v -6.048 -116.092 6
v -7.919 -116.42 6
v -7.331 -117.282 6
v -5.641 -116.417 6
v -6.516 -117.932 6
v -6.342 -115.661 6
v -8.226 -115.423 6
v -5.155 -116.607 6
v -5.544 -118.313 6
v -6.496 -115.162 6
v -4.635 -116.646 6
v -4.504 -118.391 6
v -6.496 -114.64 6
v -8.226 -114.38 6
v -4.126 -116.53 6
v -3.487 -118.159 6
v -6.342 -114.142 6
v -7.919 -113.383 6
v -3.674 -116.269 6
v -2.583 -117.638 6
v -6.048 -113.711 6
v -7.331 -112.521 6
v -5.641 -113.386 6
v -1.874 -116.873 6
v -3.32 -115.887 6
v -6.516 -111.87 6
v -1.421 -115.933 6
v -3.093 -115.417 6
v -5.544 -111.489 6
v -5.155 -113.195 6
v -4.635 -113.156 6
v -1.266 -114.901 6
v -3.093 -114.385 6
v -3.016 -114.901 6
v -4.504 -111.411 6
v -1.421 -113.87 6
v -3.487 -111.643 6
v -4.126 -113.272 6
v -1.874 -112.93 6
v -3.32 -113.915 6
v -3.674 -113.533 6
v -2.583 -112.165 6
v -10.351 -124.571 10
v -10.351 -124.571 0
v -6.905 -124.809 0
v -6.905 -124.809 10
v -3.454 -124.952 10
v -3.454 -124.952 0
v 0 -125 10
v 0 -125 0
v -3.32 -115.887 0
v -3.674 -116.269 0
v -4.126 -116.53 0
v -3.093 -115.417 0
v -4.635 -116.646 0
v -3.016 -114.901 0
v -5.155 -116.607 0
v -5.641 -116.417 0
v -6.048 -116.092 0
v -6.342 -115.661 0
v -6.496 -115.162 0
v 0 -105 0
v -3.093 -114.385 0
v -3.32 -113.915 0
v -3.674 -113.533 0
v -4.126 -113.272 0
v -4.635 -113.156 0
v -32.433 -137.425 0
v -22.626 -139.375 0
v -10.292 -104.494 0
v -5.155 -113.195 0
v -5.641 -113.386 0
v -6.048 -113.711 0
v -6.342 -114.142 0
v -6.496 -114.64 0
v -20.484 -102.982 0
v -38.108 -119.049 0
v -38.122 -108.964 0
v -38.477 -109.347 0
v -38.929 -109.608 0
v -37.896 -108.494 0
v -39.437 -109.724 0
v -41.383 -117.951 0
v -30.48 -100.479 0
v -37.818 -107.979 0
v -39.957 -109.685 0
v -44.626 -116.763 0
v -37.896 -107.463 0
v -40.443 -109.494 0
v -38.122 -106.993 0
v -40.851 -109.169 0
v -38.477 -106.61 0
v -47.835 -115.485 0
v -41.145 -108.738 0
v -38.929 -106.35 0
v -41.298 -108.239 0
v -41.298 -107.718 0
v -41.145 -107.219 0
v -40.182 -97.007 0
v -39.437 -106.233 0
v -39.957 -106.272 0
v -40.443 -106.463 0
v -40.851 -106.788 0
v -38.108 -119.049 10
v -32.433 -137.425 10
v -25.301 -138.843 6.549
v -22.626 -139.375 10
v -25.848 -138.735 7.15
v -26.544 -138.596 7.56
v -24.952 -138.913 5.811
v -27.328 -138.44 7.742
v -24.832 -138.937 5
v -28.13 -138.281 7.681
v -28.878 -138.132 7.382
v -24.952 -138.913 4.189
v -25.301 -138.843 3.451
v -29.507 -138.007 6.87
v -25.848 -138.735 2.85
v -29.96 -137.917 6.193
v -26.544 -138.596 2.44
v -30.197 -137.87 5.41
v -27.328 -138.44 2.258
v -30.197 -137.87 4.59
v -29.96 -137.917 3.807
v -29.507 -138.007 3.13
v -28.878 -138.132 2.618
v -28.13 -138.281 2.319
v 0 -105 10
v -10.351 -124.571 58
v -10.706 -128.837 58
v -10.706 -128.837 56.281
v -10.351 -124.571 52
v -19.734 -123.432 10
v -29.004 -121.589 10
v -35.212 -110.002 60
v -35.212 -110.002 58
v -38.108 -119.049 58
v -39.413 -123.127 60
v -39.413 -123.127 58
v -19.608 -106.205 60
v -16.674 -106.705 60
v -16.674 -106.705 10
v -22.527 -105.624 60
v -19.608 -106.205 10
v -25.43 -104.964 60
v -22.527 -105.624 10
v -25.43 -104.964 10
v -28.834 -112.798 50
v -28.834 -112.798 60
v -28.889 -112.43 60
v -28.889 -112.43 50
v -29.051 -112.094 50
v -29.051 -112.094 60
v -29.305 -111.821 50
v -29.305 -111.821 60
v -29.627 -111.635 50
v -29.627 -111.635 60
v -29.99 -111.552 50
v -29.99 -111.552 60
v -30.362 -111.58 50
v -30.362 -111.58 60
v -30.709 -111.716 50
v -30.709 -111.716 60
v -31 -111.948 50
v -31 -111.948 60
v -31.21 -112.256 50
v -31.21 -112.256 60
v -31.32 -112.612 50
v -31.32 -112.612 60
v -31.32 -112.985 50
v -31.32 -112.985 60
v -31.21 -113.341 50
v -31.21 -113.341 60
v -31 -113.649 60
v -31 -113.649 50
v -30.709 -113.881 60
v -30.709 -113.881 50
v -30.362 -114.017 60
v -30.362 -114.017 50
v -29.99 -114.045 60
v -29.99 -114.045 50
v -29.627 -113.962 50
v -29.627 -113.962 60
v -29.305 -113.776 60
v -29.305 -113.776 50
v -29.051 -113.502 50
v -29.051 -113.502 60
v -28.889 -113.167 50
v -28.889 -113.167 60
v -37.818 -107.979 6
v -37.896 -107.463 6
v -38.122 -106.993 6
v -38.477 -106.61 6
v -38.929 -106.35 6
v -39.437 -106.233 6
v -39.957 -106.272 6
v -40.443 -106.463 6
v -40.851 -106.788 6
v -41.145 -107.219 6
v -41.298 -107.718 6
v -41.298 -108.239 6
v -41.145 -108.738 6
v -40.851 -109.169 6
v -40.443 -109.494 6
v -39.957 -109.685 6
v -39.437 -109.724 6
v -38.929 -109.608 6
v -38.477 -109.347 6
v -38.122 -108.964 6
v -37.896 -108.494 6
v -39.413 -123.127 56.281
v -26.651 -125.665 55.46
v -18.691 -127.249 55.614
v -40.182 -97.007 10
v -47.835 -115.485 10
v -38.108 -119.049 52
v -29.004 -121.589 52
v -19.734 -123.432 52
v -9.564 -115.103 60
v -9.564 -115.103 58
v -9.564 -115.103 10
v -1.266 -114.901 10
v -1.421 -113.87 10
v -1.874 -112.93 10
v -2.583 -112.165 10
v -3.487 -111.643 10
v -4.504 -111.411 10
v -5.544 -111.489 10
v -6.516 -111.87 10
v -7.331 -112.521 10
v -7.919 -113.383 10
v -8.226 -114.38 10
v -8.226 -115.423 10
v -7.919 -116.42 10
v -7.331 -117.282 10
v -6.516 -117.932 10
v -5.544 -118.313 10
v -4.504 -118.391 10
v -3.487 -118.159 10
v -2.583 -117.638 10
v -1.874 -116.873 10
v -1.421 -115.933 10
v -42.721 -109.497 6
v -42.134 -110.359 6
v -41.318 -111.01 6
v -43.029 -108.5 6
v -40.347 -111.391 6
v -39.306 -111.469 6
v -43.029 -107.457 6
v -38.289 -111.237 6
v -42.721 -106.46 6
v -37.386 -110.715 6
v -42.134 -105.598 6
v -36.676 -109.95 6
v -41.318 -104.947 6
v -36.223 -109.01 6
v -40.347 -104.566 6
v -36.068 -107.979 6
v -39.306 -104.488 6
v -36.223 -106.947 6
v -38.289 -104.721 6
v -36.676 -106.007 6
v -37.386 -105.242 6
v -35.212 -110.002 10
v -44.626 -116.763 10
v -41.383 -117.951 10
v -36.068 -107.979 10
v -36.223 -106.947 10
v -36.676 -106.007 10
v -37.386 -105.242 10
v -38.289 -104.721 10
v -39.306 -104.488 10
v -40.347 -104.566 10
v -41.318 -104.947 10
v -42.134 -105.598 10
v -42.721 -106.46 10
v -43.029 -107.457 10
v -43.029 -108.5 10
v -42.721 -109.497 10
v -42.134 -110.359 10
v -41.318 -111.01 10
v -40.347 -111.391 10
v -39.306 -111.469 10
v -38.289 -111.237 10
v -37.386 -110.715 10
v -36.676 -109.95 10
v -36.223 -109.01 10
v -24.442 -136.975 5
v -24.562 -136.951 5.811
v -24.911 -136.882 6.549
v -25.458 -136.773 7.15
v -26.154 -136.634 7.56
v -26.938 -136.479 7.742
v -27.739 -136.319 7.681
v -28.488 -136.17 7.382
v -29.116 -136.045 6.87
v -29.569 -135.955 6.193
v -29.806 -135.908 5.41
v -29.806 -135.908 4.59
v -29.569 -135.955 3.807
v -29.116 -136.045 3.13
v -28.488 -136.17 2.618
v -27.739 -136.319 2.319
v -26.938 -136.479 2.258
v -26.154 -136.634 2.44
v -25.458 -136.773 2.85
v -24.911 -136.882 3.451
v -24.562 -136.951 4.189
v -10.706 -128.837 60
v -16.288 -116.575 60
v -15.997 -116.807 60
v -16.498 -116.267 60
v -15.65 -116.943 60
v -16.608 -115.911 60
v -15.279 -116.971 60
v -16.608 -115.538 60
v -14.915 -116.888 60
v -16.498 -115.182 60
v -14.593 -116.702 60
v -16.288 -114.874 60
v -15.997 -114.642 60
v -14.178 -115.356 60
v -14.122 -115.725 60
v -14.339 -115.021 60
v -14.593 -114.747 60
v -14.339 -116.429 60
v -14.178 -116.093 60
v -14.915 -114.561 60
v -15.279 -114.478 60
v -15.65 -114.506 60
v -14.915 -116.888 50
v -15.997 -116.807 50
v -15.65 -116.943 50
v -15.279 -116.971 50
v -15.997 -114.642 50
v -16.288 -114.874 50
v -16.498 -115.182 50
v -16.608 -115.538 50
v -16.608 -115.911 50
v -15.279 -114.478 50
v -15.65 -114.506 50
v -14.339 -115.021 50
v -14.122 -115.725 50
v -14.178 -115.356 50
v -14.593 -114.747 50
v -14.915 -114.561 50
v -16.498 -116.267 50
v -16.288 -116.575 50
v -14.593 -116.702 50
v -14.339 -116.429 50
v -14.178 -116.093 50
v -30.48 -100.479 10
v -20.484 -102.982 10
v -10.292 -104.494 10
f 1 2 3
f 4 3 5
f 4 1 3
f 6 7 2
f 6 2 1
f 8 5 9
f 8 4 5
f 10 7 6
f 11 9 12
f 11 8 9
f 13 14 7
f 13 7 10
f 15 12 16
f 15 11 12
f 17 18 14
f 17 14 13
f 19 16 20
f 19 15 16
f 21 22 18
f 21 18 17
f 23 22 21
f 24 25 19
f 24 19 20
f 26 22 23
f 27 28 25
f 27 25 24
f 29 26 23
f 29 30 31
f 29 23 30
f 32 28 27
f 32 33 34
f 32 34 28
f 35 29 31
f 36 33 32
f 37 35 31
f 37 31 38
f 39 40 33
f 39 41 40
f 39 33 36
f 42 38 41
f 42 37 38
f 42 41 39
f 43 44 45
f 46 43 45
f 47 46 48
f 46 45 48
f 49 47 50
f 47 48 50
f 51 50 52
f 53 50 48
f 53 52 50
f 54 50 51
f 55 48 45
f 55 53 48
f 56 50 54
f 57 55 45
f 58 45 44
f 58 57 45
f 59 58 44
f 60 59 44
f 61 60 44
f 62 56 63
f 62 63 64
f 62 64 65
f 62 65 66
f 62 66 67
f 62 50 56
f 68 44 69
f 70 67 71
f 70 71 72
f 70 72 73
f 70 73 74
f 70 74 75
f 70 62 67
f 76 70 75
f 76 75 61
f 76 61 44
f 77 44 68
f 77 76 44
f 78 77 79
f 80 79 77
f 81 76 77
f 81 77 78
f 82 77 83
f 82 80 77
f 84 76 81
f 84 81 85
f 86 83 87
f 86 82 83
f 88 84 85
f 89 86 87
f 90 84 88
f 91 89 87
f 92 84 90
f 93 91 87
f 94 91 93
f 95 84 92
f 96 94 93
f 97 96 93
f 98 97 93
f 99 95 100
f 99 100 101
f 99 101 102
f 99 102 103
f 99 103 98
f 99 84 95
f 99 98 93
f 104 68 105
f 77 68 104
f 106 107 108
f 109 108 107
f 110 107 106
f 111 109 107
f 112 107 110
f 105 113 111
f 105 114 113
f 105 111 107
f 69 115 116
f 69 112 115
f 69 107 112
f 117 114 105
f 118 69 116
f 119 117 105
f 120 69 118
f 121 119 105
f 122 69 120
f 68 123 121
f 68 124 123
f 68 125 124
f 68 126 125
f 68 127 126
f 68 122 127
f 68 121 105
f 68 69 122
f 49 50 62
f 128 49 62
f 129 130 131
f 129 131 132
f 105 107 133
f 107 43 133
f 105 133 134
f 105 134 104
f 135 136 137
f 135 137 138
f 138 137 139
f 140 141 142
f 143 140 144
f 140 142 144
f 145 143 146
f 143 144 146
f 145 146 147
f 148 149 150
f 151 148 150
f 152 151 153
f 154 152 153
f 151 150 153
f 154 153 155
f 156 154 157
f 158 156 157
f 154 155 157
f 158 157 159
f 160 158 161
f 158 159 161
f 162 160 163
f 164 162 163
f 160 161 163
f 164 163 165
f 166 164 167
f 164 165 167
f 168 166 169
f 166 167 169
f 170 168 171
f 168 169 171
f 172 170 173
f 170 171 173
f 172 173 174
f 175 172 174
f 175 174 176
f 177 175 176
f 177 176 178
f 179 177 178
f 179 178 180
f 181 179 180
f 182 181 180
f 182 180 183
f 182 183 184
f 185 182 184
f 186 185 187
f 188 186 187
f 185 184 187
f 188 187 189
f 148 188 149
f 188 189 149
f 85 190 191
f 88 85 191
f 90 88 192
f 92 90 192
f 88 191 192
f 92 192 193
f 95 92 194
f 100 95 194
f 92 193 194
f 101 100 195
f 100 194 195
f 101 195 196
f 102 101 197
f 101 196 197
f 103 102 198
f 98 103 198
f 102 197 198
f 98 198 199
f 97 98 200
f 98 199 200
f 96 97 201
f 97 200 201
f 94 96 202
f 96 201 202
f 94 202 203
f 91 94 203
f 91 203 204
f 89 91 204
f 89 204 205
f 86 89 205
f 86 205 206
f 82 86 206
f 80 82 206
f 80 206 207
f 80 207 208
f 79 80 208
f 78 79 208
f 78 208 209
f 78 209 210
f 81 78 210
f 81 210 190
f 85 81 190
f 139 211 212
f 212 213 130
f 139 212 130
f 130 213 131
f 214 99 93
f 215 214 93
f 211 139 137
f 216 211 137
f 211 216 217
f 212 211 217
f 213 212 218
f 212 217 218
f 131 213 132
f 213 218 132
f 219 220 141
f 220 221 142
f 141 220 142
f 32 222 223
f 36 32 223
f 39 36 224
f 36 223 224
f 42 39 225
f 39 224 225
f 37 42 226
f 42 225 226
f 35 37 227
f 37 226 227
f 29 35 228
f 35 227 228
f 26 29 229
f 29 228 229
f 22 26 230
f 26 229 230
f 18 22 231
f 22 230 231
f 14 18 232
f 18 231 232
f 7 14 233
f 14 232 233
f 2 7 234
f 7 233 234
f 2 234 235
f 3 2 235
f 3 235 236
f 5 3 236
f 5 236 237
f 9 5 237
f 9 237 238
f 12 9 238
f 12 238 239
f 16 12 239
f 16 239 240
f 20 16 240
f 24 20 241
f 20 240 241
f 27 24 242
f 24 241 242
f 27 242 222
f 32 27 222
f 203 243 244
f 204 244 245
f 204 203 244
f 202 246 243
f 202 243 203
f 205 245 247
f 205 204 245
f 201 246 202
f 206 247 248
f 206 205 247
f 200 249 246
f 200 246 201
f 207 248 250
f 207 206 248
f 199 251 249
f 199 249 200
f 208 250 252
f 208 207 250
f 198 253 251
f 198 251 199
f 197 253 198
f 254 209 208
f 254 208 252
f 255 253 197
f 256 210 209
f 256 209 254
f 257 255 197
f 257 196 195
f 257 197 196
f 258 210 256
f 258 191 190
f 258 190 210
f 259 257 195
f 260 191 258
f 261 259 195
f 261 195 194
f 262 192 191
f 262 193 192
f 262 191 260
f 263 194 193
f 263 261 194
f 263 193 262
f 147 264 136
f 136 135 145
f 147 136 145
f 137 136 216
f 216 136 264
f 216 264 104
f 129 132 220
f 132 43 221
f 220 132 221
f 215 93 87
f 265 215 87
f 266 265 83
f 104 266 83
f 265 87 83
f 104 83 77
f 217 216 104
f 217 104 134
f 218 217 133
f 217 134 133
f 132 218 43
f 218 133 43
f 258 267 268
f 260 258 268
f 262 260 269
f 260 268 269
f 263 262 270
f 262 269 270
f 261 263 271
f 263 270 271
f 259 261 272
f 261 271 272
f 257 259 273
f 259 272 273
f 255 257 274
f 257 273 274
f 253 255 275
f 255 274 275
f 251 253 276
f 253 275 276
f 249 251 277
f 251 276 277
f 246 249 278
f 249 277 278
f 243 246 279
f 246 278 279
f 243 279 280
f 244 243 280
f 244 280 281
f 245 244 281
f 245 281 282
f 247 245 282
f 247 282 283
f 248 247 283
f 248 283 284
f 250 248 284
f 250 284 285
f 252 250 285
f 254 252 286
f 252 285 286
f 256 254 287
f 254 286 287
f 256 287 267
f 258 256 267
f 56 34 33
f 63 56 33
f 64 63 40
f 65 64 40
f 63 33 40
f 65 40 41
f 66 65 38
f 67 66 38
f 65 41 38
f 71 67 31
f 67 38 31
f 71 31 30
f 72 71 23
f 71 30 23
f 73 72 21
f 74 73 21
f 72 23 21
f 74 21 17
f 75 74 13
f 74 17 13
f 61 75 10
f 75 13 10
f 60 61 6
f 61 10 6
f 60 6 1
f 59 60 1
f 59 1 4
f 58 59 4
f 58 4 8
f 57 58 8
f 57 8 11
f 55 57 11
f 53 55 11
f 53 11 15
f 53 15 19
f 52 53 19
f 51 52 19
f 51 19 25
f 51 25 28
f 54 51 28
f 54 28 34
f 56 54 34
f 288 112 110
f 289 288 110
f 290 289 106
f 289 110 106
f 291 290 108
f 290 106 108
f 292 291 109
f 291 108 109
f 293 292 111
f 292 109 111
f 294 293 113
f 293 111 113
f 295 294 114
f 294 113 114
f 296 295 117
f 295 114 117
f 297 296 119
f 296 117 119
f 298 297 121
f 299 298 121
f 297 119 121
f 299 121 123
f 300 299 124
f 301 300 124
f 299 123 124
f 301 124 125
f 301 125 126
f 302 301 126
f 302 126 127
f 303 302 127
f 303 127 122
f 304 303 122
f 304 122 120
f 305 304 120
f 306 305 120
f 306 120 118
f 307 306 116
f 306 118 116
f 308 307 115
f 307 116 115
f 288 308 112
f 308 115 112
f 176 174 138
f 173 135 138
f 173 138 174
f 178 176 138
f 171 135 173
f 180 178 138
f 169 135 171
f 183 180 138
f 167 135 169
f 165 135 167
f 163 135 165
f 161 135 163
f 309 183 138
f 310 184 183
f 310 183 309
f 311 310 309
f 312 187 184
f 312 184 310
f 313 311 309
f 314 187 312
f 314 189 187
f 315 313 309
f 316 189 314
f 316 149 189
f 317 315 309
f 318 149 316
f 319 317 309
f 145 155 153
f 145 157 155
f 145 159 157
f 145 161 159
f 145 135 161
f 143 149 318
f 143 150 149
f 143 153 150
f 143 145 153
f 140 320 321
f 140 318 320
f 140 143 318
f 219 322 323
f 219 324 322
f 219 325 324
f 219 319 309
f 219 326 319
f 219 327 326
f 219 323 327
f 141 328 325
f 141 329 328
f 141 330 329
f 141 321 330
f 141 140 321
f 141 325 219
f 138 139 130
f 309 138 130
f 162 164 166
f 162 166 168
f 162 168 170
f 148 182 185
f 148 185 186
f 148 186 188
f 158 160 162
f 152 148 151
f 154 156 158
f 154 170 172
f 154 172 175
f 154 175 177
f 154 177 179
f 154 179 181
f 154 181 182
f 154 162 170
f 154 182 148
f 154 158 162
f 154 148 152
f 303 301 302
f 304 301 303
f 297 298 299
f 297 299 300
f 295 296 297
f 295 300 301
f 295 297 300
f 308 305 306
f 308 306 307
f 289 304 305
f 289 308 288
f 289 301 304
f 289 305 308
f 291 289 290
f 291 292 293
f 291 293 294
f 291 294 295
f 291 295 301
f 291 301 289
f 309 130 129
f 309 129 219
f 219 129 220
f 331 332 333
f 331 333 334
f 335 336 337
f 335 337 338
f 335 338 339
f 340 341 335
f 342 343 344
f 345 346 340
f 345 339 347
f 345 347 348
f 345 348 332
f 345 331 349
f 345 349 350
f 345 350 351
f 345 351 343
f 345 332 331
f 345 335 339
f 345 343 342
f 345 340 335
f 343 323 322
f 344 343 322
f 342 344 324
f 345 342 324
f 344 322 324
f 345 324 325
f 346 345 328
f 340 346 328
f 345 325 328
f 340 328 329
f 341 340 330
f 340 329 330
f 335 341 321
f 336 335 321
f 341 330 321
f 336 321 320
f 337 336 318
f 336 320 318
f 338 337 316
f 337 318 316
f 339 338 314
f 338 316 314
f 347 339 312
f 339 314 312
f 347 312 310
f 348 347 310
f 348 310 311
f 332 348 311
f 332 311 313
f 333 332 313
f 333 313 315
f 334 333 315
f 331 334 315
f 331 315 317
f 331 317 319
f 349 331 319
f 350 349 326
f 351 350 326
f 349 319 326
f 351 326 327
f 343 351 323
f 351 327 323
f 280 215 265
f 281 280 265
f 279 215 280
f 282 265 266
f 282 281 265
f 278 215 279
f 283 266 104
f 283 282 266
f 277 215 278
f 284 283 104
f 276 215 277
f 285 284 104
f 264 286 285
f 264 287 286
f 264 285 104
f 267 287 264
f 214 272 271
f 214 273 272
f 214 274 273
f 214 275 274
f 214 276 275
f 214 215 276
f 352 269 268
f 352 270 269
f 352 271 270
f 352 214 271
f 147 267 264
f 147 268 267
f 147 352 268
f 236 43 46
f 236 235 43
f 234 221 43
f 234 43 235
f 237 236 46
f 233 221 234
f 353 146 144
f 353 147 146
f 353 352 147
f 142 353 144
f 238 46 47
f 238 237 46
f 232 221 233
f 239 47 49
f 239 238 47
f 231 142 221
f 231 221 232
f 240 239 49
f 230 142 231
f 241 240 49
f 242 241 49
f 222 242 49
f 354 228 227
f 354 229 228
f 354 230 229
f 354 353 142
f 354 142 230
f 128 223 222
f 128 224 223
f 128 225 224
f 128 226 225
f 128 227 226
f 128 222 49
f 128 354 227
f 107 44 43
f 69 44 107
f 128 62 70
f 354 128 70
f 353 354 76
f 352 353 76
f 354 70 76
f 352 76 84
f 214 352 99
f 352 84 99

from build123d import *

# Parameters (mm, degrees)
BOSS_EXTRU_1_DEPTH      = 10
BOSS_EXTRU_2_DEPTH      = 48
BOSS_EXTRU_3_DEPTH      = 2
CHANFREIN1_SIZE         = 6
ENL_V_MAT_EXTRU_1_REACH = 148.244
ESQUISSE5_R             = 1.75
ESQUISSE6_R             = 3.5
ENL_V_MAT_EXTRU_2_DEPTH = 4
CHANFREIN2_SIZE         = 7.5
ESQUISSE7_R             = 1.25
ENL_V_MAT_EXTRU_3_DEPTH = 10
BOSS_EXTRU_4_DEPTH      = 10
ESQUISSE9_R             = 2.75
ENL_V_MAT_EXTRU_4_DEPTH = 2


with BuildPart() as part:
    # Esquisse1 → Boss.-Extru.1 (new body)
    with BuildSketch(Plane.XY):
        with BuildLine():
            Line((-40.181760398, -97.007350914), (-47.835429046, -115.484941564))
            ThreePointArc((-47.835429046, -115.484941564), (-24.386290252, -122.59816005), (0, -125))
            Line((0, -125), (0, -105))
            ThreePointArc((0, -105), (-20.484483812, -102.982454442), (-40.181760398, -97.007350914))
        make_face()
    extrude(amount=BOSS_EXTRU_1_DEPTH)

    # Esquisse2 → Boss.-Extru.2 (add)
    with BuildSketch(Plane.XY.offset(10)):
        with BuildLine():
            Line((-32.925344295, -102.858746361), (-38.108037379, -119.049474955))
            ThreePointArc((-38.108037379, -119.049474955), (-24.386290252, -122.59816005), (-10.351025939, -124.570687812))
            Line((-10.351025939, -124.570687812), (-8.943286411, -107.62907427))
            ThreePointArc((-8.943286411, -107.62907427), (-21.069754778, -105.924810284), (-32.925344295, -102.858746361))
        make_face()
    extrude(amount=BOSS_EXTRU_2_DEPTH)

    # Esquisse4 → Boss.-Extru.3 (add)
    with BuildSketch(Plane.XY.offset(58)):
        with BuildLine():
            Line((-39.413172773, -123.12671677), (-10.705530953, -128.837021766))
            Line((-10.705530953, -128.837021766), (-8.943286411, -107.62907427))
            ThreePointArc((-8.943286411, -107.62907427), (-21.069754778, -105.924810284), (-32.925344295, -102.858746361))
            Line((-32.925344295, -102.858746361), (-39.413172773, -123.12671677))
        make_face()
    extrude(amount=BOSS_EXTRU_3_DEPTH)

    # Chanfrein1
    # the kernel refuses this chamfer: 6 mm, written as the material it adds along each edge
    with BuildSketch(Plane(origin=(0, 0, 58), x_dir=(-0.3048642990280114, -0.9523957996432781, 0), z_dir=(-0.9523957996432781, 0.3048642990280114, 0))) as chanfrein1_piece_1_section:
        Polygon((125 + CHANFREIN1_SIZE, 0), (125, -CHANFREIN1_SIZE), (125, 0), align=None)
    chanfrein1_piece_1 = revolve(axis=Axis((0, 0, 58), (0, 0, 1)), revolution_arc=13, mode=Mode.PRIVATE)
    chanfrein1_piece_1 = split(chanfrein1_piece_1, bisect_by=Plane(origin=(-25.059351863, -125.981869268, 58), z_dir=(0.19509032201612828, 0.9807852804032304, 0)), keep=Keep.TOP, mode=Mode.PRIVATE)
    add(chanfrein1_piece_1)

    # Esquisse5 → Enlèv. mat.-Extru.1 (cut, up to next)
    with BuildSketch(Plane.XY.offset(10), mode=Mode.PRIVATE) as enl_v_mat_extru_1_sk1:
        with Locations((-4.765565521, -114.901215769)):
            Circle(ESQUISSE5_R)
    enl_v_mat_extru_1_tool1 = extrude(enl_v_mat_extru_1_sk1.sketch, amount=-ENL_V_MAT_EXTRU_1_REACH, mode=Mode.PRIVATE) & part.part
    # Esquisse5 → Enlèv. mat.-Extru.1 (cut, up to next)
    with BuildSketch(Plane.XY.offset(10), mode=Mode.PRIVATE) as enl_v_mat_extru_1_sk2:
        with Locations((-39.567983188, -107.978584481)):
            Circle(ESQUISSE5_R)
    enl_v_mat_extru_1_tool2 = extrude(enl_v_mat_extru_1_sk2.sketch, amount=-ENL_V_MAT_EXTRU_1_REACH, mode=Mode.PRIVATE) & part.part
    add(enl_v_mat_extru_1_tool1.solids().sort_by_distance((-4.765566, -114.901216, 10))[0], mode=Mode.SUBTRACT)
    add(enl_v_mat_extru_1_tool2.solids().sort_by_distance((-39.567983, -107.978584, 10))[0], mode=Mode.SUBTRACT)

    # Esquisse6 → Enlèv. mat.-Extru.2 (cut)
    with BuildSketch(Plane.XY.offset(10)):
        with Locations((-39.567983188, -107.978584481)):
            Circle(ESQUISSE6_R)
        with Locations((-4.765565521, -114.901215769)):
            Circle(ESQUISSE6_R)
    extrude(amount=-ENL_V_MAT_EXTRU_2_DEPTH, mode=Mode.SUBTRACT)

    # Chanfrein2
    # the kernel refuses this chamfer: 7.5 mm, written as the material it takes off along each edge
    with BuildSketch(Plane(origin=(-8.943286411, -107.62907427, 10), x_dir=(-0.08280820751335238, -0.996565502497666, 0), z_dir=(0, 0, 1)), Plane(origin=(-32.925344295, -102.858746361, 80.019854797), x_dir=(-0.3048642990290983, -0.9523957996429303, 0), z_dir=(0, 0, -1))) as chanfrein2_piece_1:
        with BuildLine():
            Line((CHANFREIN2_SIZE, 0), (-0.280634385, -7.780634385))
            ThreePointArc((-0.280634385, -7.780634385), (-0.074202159, -4.002769088), (0, 0))
            Line((0, 0), (CHANFREIN2_SIZE, 0))
        make_face()
    extrude(amount=70.019854797, mode=Mode.SUBTRACT)

    # Esquisse7 → Enlèv. mat.-Extru.3 (cut)
    with BuildSketch(Plane.XY.offset(60)):
        with Locations((-30.083912118, -112.798307752)):
            Circle(ESQUISSE7_R)
        with Locations((-15.372132912, -115.724662582)):
            Circle(ESQUISSE7_R)
    extrude(amount=-ENL_V_MAT_EXTRU_3_DEPTH, mode=Mode.SUBTRACT)

    # Esquisse8 → Boss.-Extru.4 (add)
    with BuildSketch(Plane(origin=(0, 0, 0), x_dir=(-1, 0, 0), z_dir=(0, 0, -1))):
        with BuildLine():
            Line((22.625550905, -139.375480075), (32.433403709, -137.424576855))
            Line((32.433403709, -137.424576855), (38.108037379, -119.049474955))
            ThreePointArc((38.108037379, -119.049474955), (24.386290252, -122.59816005), (10.351025939, -124.570687812))
            Line((10.351025939, -124.570687812), (22.625550905, -139.375480075))
        make_face()
    extrude(amount=-BOSS_EXTRU_4_DEPTH)

    # Esquisse9 → Enlèv. mat.-Extru.4 (cut)
    with BuildSketch(Plane(origin=(-27.529477307, -138.400028465, 0), x_dir=(0.9807852804032304, -0.19509032201612822, 0), z_dir=(-0.19509032201612822, -0.9807852804032304, 0))):
        with Locations((0, 5)):
            Circle(ESQUISSE9_R)
    extrude(amount=-ENL_V_MAT_EXTRU_4_DEPTH, mode=Mode.SUBTRACT)


solid = part.part
